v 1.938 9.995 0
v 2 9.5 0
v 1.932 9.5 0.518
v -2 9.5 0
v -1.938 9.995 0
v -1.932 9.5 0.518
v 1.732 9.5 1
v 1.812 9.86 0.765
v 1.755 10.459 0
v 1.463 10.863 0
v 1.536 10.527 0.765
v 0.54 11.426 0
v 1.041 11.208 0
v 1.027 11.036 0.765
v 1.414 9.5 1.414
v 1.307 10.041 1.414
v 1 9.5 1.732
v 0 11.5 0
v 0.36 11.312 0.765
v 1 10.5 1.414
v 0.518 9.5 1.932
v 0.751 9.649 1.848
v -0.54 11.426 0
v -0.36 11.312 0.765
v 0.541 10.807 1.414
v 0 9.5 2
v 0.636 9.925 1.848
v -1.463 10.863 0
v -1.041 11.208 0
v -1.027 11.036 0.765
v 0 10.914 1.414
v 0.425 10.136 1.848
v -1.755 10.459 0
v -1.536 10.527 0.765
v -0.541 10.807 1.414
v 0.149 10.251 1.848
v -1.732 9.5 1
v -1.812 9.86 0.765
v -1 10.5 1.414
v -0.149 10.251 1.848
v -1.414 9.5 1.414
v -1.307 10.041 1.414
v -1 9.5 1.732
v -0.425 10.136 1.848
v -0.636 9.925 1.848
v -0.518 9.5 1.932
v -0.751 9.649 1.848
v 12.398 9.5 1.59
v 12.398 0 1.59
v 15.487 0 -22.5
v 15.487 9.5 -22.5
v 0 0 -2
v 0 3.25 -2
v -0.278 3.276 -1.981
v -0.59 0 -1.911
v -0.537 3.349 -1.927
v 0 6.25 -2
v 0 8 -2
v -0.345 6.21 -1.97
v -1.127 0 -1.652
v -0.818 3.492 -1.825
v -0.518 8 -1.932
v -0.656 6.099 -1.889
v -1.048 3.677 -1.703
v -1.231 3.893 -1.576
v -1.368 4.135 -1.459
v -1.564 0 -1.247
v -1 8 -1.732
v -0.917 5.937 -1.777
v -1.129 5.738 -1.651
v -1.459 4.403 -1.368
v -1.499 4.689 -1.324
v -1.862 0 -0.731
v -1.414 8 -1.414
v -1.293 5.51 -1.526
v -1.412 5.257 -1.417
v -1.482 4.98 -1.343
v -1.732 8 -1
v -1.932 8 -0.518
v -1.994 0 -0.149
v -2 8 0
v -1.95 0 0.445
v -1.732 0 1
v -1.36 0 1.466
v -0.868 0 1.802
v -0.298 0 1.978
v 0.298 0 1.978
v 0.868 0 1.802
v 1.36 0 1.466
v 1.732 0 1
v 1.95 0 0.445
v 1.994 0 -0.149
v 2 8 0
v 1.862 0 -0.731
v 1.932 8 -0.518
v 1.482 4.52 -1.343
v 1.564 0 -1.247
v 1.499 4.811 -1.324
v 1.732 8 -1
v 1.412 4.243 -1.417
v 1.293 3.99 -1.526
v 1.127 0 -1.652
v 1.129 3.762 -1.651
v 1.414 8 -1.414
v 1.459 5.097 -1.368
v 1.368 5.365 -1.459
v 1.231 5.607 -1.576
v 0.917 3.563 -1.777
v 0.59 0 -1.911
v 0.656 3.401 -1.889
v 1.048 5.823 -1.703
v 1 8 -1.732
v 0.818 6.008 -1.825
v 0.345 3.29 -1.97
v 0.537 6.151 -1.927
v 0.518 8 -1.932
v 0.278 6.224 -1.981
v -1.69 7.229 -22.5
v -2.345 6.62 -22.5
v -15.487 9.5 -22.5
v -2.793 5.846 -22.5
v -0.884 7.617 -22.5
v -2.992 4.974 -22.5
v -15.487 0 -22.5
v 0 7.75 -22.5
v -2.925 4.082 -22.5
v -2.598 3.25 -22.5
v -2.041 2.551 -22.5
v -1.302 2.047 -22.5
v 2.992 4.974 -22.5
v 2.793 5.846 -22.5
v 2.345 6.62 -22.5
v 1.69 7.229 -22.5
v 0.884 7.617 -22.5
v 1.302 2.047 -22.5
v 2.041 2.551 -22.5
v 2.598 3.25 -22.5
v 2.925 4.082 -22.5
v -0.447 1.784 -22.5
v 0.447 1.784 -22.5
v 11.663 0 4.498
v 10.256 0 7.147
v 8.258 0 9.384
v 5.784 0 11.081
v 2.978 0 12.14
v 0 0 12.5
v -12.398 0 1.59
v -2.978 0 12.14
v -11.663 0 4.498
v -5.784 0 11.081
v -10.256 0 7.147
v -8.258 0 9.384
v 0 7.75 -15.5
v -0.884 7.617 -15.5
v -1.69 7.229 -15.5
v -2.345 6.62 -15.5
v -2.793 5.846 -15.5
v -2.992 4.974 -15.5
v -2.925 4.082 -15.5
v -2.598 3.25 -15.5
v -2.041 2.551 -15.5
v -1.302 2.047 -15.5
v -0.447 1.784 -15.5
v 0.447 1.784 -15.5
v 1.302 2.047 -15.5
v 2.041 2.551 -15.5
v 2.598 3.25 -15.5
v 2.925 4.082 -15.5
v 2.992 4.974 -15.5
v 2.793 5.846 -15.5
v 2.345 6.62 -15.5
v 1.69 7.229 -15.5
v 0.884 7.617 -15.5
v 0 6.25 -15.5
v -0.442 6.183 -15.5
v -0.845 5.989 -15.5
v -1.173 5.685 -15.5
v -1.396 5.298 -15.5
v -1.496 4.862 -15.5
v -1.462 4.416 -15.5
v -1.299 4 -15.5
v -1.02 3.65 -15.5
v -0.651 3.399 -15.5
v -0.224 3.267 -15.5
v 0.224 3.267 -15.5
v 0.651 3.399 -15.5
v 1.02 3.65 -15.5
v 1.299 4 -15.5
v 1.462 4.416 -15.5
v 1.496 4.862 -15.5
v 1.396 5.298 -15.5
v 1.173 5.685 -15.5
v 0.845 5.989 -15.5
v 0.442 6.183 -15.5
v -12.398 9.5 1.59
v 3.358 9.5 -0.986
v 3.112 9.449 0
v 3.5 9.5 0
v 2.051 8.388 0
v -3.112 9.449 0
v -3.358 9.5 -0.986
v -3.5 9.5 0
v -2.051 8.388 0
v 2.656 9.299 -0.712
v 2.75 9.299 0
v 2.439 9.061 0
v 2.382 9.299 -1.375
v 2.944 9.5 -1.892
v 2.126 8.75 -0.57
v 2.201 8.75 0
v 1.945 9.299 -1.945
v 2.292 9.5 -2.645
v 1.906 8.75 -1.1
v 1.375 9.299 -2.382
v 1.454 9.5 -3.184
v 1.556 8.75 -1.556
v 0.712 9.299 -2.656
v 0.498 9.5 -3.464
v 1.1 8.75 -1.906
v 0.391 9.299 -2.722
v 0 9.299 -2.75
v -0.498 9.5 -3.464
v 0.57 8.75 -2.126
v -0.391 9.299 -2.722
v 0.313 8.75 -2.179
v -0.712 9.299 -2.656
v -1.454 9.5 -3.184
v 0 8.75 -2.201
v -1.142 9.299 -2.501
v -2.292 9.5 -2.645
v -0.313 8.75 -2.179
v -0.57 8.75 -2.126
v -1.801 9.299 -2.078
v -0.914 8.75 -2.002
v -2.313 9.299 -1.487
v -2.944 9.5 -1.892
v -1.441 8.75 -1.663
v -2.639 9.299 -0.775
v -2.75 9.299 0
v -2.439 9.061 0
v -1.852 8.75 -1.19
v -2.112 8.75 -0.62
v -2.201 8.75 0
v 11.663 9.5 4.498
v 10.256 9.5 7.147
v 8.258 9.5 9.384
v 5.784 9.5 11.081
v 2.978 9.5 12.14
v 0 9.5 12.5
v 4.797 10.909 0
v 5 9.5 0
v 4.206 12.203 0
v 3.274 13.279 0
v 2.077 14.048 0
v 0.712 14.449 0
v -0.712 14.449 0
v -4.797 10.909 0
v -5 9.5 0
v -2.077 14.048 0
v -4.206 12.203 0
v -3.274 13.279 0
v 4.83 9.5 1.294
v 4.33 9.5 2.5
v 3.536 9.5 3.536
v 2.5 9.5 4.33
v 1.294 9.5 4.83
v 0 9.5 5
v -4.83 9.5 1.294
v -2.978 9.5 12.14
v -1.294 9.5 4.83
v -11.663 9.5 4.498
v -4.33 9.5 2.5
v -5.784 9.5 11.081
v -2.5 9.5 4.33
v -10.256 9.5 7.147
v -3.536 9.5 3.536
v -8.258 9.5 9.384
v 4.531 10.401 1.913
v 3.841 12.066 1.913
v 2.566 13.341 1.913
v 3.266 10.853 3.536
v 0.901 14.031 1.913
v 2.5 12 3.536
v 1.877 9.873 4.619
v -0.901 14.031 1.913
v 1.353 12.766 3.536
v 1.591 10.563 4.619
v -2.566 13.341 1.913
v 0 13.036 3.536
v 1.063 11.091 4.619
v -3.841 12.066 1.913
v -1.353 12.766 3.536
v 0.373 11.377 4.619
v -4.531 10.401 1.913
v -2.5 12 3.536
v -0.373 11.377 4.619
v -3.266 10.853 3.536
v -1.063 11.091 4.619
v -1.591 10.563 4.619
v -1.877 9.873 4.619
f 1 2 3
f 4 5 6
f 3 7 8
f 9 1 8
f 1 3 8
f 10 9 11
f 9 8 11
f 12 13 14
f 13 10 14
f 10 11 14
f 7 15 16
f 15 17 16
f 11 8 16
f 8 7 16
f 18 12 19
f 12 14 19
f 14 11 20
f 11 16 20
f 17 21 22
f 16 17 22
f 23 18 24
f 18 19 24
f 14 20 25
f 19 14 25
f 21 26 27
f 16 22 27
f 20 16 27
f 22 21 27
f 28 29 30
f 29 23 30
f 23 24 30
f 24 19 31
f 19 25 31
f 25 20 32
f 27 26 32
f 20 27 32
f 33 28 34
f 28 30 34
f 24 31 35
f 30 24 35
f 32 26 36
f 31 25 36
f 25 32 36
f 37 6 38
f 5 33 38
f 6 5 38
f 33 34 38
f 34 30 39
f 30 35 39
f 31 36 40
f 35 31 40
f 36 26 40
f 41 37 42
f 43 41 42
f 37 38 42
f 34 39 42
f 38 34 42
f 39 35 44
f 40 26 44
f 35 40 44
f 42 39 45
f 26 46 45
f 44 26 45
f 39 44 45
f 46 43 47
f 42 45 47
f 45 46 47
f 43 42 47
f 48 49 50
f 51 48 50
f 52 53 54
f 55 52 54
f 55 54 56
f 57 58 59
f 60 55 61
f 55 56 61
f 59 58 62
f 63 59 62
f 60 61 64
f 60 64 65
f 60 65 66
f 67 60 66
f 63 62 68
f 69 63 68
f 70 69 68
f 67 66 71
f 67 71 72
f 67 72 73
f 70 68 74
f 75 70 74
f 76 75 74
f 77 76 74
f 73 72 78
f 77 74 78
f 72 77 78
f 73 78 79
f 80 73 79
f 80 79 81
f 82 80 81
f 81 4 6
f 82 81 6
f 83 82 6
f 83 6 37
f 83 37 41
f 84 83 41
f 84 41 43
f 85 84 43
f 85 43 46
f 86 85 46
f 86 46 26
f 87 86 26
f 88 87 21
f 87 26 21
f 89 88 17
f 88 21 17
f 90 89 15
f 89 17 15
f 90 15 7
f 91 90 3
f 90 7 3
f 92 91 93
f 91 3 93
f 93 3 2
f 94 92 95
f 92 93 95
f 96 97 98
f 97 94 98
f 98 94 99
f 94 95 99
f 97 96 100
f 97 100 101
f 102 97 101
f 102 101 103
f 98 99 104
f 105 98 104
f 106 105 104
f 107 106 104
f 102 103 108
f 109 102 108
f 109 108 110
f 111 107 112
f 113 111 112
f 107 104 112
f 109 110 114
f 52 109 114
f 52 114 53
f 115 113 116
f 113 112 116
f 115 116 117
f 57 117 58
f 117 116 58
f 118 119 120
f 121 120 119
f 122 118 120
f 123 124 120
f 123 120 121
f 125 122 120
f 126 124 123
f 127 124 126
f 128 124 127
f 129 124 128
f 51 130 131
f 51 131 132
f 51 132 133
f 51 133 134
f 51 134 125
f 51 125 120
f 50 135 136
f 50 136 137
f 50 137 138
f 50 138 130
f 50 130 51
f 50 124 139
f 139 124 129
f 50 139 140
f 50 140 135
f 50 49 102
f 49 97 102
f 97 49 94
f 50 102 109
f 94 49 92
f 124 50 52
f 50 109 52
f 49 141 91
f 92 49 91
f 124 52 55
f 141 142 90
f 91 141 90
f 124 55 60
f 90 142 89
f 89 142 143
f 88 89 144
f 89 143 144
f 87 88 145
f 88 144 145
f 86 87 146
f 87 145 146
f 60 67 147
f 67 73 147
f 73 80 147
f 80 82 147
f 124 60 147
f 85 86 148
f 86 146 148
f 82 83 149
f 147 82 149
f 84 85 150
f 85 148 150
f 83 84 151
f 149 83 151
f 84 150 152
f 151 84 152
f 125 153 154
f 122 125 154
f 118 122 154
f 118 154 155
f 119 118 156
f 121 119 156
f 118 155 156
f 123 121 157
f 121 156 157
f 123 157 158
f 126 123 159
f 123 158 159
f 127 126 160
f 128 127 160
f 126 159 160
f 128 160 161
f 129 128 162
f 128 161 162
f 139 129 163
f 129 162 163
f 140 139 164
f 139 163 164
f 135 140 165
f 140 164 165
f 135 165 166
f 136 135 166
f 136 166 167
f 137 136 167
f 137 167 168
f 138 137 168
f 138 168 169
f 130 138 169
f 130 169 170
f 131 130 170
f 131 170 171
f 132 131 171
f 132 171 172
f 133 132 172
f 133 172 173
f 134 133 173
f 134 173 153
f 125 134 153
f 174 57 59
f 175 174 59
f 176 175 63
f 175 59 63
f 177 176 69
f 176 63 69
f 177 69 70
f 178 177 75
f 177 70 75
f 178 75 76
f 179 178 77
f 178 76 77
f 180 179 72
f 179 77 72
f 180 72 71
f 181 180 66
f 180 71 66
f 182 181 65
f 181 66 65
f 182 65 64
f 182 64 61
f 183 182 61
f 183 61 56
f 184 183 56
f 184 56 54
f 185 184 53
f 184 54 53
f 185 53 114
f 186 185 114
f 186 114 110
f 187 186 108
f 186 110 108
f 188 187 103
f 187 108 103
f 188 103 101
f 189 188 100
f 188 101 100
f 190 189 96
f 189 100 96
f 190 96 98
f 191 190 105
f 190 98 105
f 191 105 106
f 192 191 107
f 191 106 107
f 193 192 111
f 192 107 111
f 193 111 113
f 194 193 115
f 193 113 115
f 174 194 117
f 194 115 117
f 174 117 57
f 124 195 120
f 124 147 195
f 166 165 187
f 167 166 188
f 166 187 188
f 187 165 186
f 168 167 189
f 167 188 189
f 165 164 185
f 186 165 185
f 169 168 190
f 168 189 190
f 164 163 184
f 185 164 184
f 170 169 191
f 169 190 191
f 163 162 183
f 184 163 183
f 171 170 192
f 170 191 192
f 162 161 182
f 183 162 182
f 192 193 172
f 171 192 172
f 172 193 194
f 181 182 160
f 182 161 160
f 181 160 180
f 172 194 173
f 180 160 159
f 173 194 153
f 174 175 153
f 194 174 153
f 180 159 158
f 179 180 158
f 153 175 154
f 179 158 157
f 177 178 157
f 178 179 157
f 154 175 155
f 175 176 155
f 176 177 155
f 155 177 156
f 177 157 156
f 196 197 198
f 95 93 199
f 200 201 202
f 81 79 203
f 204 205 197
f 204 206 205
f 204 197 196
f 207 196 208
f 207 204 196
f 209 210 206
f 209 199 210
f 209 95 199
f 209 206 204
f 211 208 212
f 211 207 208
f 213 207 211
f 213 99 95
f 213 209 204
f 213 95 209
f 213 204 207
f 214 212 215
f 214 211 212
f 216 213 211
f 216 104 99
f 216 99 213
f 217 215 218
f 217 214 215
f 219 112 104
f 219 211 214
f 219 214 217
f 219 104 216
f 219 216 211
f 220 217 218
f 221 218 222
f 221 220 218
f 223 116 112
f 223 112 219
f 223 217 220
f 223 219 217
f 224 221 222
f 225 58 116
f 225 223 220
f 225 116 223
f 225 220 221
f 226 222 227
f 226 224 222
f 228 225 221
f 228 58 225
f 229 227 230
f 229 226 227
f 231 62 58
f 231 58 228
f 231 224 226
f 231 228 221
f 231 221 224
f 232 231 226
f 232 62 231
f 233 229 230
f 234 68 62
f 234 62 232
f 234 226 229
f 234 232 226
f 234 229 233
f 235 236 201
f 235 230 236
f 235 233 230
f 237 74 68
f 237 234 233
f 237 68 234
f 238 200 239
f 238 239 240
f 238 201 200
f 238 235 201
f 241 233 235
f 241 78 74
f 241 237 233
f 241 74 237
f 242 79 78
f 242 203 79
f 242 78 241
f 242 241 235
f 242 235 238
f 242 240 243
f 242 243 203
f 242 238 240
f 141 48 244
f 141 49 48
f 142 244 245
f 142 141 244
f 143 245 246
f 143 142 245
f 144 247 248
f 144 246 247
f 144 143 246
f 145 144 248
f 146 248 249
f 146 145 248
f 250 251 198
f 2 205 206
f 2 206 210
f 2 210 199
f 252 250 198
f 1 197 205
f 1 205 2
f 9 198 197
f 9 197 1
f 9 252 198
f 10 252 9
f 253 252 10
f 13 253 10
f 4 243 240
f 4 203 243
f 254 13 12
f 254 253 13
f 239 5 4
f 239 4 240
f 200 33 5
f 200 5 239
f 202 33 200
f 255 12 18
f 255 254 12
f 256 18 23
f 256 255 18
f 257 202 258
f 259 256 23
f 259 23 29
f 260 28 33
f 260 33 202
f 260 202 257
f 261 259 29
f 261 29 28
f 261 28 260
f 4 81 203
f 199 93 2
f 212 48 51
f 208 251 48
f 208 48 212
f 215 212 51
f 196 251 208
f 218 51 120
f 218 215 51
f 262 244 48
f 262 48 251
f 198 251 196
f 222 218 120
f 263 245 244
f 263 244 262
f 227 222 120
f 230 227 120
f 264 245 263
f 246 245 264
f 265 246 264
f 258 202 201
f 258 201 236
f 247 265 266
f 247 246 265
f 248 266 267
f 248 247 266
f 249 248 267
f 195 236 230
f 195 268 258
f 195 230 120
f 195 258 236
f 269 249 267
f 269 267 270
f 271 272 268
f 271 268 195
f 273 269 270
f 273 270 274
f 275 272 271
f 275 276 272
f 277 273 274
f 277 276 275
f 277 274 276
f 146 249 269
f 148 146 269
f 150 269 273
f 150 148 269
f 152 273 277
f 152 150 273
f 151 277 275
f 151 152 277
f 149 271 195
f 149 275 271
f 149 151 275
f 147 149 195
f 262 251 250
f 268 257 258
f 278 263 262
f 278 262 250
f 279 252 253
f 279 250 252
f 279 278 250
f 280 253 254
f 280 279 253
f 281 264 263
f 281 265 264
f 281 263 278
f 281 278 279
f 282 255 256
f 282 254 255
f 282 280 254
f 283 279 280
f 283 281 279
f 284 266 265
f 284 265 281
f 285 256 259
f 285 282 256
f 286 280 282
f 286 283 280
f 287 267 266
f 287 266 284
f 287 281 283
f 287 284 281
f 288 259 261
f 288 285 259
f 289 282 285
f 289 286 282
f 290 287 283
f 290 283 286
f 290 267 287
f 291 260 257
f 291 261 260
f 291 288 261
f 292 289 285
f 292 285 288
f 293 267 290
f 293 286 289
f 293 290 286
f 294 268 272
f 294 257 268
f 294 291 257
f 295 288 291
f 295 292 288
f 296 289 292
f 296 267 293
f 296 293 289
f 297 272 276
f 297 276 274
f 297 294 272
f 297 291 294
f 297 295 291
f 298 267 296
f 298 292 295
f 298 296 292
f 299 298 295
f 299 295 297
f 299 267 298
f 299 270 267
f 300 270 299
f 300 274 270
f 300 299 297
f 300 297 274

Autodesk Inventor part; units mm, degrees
ref_plane "YZ Plane" through (0, 0, 0) normal (1, 0, 0) x (0, 1, 0)
ref_plane "XZ Plane" through (0, 0, 0) normal (0, 1, 0) x (-1, 0, 0)
ref_plane "XY Plane" through (0, 0, 0) normal (0, 0, 1) x (1, 0, 0)
sketch "Skizze1" plane through (0, 0, 0) normal (0, 1, 0) x (-1, 0, 0)
  arc A0 (12.3985, 1.5897) -> (0, 12.5) centre (0, 0) ccw
  line L0 (0, -34.7678) -> (0, 23.1071) construction
  line L1 (12.3985, 1.5897) -> (16, -26.5)
  line L2 (16, -26.5) -> (0, -26.5)
  arc A1 (0, 12.5) -> (-12.3985, 1.5897) centre (0, 0) ccw
  line L3 (-12.3985, 1.5897) -> (-16, -26.5)
  line L4 (-16, -26.5) -> (0, -26.5)
  line L5 (15.4871, -22.5) -> (-15.4871, -22.5)
  dimension "d0" = 25
  dimension "d1" = 32
  dimension "d2" = 39
  dimension "d3" = 35
extrude "Extrusion1" add sketch "Skizze1" along normal blind 9.5 contours L1 L5 L3 A1 A0
hole "Bohrung1" at (0, 0, 0) direction (0, 1, 0) diameter 4 depth 9.5
sketch "Skizze2" plane through (0, 9.5, 0) normal (0, 1, 0) x (1, 0, 0)
  line L0 (0, 29.5) -> (0, -19.5) projected
  arc A0 (-5, 0) -> (0, -5) centre (0, 0) ccw
  line L1 (-21.682, 0) -> (21.682, 0) projected
  circle A1 centre (0, 0) radius 2 projected
  line L2 (0, -5) -> (0, -2)
  line L3 (-2, 0) -> (-5, 0)
  point P0 (0, 5)
  dimension "d6" = 10
revolve "Umdrehung1" add sketch "Skizze2" angle 180 about axis through (0, 9.5, 0) along (0, 0, -1) contours L0 A0 L1 A1
fillet "Rundung1" radius 1.5 4 edges at (-1.4142, 9.5, -1.4142) (1.4142, 9.5, -1.4142) (-1.4142, 9.5, 1.4142) (1.4142, 9.5, 1.4142)
sketch "Skizze3" plane through (15.4871, 0, -22.5) normal (0, 0, -1) x (-1, 0, 0)
  line L0 (0, 0) -> (30.9743, 0) projected
  line L1 (30.9743, 0) -> (30.9743, 9.5) projected
  line L2 (0, 9.5) -> (30.9743, 9.5) projected
  line L3 (0, 0) -> (0, 9.5) projected
  line L4 (3.0886, 9.5) -> (0, 9.5) projected
  line L5 (0, 9.5) -> (30.9743, 0) construction
  line L6 (30.9743, 9.5) -> (0, 0) construction
  point P0 (15.4871, 0)
  point P1 (15.4871, 4.75)
hole "Bohrung2" at (0, 4.75, -22.5) direction (0, 0, 1) diameter 3 end up to surface counterbore diameter 6 counterbore depth 7
properties part number "Steitenteil_kabel"
